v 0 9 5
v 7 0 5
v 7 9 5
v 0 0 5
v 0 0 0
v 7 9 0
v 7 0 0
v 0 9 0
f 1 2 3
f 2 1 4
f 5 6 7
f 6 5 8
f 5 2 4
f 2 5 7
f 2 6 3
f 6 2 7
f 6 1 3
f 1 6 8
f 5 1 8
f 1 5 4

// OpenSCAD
// Generated by SolidPython 1.0.1 on 2020-07-29 00:46:55


cube(size = [7, 9, 5]);
/***********************************************
*********      SolidPython code:      **********
************************************************
 
# import packages: SolidPython
from solid import *
from solid.utils import *
from itertools import chain, combinations, permutations


class Resize:

    def __init__(self, scad_file):
        self.scad_file = scad_file
        #self.scad_file = import_scad(scad_file)
        # cone/cylinder param:
        self.r1 = 0
        self.r2 = 0
        self.h = 0
        # rectangular prism param:
        self.w = 0
        self.l = 0
        # ellipse param:
        self.r = 0

    # import OpenScad code (file name corresponds to shape)


    # classify shape + parameters
    def assign(self, param1, param2, param3):
        if self.scad_file == 'cone.scad':
            self.r1 = param1
            self.r2 = param2
            self.h = param3
        elif self.scad_file == 'cylinder.scad':
            self.r1 = param1
            self.r2 = param2
            self.h = param3
        elif self.scad_file == 'rectangularPrism.scad':
            self.h = param1
            self.l = param2
            self.w = param3
        else:
            self.r = param1
            self.h = param2

    # resize parameters
    def iterate(self):
        x = range(3, 20, 2)
        i = 1
        if self.scad_file == 'cone.scad':
            tempList = list(permutations(x, 2))
            for temp in tempList:
                param1 = temp[0]
                param2 = temp[1]
                filepath = 'produced_scad_files/' + 'cone' + str(param1) + '_' + str(param2) + '_' + '.scad'
                scad_render_to_file(cylinder(h=param1, r1=param2, r2=0), filepath)

        elif self.scad_file == 'cylinder.scad':
            tempList = list(permutations(x, 3))
            for temp in tempList:
                param1 = temp[0]
                param2 = temp[1]
                filepath = 'produced_scad_files/' + 'cylinder' + str(param1) + '_' + str(param2) + '_' + '.scad'
                scad_render_to_file(cylinder(h=param1, r1=param2, r2=param2), filepath)

        elif self.scad_file == 'rectangularPrism.scad':
            tempList = list(permutations(x, 3))
            for temp in tempList:
                param1 = temp[0]
                param2 = temp[1]
                param3 = temp[2]
                filepath = 'produced_scad_files/' + 'rectangularPrism' + str(param1) + '_' + str(param2) + '_' + str(
                    param3) + '.scad'
                scad_render_to_file(cube(size=(param1, param2, param3)), filepath)

        elif self.scad_file == 'ellipse.scad':
            tempList = list(permutations(x, 4))
            for temp in tempList:
                param1 = temp[0]
                param2 = temp[1]
                param3 = temp[2]
                param4 = temp[3]
                filepath = 'produced_scad_files/' + 'ellipse' + str(param1) + '_' + str(param2) + '_' + str(param3) + '_' + str(param4) + '.scad'
                scad_render_to_file(scale([param1, param2, param3])(sphere(r=param4)), filepath)

    def render_to_scadfile(self):
        scad_render_to_file(scad, 'example.scad') 
 
************************************************/
